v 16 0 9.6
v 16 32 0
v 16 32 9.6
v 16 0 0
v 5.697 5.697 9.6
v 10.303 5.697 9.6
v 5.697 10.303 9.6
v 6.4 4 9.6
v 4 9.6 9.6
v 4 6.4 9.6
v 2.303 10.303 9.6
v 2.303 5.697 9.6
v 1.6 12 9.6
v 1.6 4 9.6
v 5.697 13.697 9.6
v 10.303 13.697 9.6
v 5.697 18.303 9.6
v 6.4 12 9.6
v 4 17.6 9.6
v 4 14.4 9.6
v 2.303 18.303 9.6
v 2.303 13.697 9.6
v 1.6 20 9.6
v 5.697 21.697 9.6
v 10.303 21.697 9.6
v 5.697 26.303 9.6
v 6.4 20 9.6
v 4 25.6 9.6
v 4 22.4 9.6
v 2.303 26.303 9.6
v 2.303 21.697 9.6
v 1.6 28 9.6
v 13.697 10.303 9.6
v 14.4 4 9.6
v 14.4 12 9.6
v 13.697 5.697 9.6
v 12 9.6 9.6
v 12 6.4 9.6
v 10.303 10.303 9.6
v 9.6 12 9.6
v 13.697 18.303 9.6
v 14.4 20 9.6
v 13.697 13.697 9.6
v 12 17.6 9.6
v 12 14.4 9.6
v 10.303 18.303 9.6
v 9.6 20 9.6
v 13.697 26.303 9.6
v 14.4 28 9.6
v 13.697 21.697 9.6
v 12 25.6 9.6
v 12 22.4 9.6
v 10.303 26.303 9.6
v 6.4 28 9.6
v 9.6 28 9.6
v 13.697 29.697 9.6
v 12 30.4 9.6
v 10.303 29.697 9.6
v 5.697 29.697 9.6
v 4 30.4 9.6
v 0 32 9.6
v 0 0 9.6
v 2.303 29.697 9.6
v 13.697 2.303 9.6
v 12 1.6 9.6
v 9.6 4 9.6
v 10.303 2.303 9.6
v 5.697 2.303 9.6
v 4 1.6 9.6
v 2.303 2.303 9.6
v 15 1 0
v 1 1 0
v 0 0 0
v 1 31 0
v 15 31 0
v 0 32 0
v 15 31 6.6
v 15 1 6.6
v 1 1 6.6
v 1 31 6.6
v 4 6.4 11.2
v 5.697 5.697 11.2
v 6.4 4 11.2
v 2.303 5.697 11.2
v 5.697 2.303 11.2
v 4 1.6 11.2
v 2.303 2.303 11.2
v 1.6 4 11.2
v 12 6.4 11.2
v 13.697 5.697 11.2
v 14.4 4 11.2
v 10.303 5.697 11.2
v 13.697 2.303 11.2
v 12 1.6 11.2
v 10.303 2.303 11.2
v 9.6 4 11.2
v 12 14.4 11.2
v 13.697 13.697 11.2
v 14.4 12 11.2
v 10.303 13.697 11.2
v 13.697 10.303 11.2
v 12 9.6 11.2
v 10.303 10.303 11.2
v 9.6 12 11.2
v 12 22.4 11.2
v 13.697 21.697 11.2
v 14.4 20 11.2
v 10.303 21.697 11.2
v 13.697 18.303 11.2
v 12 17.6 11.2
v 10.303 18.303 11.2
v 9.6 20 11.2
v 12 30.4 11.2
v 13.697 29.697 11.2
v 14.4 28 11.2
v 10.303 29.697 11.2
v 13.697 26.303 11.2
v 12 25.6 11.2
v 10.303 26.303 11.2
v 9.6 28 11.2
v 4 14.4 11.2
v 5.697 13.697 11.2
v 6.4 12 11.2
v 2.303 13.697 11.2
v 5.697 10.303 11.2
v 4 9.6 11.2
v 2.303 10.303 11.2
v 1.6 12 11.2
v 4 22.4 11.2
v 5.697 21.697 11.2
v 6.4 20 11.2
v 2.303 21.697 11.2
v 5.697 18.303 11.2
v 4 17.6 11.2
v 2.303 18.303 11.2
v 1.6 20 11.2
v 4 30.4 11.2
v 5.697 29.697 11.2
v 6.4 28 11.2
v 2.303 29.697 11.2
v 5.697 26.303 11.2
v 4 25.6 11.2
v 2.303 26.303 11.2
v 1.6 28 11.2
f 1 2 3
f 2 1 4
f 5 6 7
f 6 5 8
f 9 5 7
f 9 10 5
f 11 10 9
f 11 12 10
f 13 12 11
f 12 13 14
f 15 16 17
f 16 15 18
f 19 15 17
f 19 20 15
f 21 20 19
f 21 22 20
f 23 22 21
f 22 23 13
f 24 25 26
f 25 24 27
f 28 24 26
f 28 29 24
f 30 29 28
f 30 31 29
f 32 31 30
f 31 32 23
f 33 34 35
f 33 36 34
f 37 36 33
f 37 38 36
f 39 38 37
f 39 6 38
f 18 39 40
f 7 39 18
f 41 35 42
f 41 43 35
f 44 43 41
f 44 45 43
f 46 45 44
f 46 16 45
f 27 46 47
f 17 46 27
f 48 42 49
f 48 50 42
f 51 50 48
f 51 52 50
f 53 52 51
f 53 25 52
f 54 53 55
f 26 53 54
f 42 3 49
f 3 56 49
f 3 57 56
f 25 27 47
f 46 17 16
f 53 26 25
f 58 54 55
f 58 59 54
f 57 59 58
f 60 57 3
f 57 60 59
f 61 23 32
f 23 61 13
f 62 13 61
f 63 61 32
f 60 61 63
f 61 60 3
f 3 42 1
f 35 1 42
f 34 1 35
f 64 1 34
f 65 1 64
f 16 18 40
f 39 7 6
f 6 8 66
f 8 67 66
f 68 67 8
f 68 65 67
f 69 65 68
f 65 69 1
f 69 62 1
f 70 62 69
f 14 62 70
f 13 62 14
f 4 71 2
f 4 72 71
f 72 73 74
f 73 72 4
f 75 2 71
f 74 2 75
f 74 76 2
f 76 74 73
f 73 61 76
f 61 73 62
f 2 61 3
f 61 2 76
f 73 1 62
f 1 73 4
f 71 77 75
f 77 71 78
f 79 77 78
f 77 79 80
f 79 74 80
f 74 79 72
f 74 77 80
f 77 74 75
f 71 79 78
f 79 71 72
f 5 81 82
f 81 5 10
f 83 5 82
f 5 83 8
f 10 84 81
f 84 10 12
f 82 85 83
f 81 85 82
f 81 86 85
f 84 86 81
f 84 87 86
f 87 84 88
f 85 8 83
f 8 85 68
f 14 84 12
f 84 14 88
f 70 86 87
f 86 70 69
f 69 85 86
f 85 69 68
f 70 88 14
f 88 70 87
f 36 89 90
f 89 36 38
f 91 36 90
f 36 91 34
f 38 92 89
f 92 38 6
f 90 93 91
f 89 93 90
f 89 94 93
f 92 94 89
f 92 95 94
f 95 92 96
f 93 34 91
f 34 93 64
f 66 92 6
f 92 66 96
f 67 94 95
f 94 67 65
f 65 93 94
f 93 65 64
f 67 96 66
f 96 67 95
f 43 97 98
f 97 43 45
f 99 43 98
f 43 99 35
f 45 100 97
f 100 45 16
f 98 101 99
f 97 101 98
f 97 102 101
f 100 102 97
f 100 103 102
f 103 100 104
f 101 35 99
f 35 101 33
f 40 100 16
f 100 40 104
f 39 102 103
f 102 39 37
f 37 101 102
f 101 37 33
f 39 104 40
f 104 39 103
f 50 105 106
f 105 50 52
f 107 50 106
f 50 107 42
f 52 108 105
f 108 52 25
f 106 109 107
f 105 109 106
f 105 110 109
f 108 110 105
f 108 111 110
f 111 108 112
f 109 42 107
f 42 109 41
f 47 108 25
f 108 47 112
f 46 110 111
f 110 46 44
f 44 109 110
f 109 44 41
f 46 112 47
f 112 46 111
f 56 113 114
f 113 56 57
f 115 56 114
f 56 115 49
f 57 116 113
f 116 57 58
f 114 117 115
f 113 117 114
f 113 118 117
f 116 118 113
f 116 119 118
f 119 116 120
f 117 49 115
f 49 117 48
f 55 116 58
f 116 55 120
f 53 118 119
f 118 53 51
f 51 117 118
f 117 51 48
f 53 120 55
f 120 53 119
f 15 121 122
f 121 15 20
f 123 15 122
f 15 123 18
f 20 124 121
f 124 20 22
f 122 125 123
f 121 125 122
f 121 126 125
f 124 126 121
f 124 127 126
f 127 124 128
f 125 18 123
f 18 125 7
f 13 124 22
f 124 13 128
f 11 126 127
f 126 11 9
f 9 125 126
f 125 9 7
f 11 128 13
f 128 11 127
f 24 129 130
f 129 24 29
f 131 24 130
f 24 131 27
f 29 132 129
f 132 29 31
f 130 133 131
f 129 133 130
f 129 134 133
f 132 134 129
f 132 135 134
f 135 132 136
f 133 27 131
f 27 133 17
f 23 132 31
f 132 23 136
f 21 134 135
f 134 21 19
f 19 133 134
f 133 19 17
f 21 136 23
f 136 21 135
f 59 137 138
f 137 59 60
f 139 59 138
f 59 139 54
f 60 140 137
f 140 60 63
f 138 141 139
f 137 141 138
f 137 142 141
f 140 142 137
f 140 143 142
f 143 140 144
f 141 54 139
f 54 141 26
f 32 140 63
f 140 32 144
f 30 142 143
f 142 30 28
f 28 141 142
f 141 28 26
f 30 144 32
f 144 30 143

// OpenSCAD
//lego brick model
//Matthew Croft

//parameters----------------------------
unit= 1.6;

//renders---------------------------------------
block(w=2,l=4);
//moduels---------------------------------------

//brick
module block (w=2,l=4) {
   difference(){
cube(size=[unit*10, unit*20, unit*6]);
translate([1,1,-1]) cube(size=[unit*10-2, unit*20-2, unit*6-2]);
}
translate([unit*2.5,unit*2.5,unit*6]) cylinder(d=unit*3, h=unit*1);
translate([unit*7.5,unit*2.5,unit*6]) cylinder(d=unit*3, h=unit*1);
translate([unit*7.5,unit*7.5,unit*6]) cylinder(d=unit*3, h=unit*1);
translate([unit*7.5,unit*12.5,unit*6]) cylinder(d=unit*3, h=unit*1);
translate([unit*7.5,unit*17.5,unit*6]) cylinder(d=unit*3, h=unit*1);
translate([unit*2.5,unit*7.5, unit*6]) cylinder(d=unit*3, h=unit*1);
translate([unit*2.5,unit*12.5, unit*6]) cylinder(d=unit*3, h=unit*1);
translate([unit*2.5,unit*17.5, unit*6]) cylinder(d=unit*3, h=unit*1);
}
